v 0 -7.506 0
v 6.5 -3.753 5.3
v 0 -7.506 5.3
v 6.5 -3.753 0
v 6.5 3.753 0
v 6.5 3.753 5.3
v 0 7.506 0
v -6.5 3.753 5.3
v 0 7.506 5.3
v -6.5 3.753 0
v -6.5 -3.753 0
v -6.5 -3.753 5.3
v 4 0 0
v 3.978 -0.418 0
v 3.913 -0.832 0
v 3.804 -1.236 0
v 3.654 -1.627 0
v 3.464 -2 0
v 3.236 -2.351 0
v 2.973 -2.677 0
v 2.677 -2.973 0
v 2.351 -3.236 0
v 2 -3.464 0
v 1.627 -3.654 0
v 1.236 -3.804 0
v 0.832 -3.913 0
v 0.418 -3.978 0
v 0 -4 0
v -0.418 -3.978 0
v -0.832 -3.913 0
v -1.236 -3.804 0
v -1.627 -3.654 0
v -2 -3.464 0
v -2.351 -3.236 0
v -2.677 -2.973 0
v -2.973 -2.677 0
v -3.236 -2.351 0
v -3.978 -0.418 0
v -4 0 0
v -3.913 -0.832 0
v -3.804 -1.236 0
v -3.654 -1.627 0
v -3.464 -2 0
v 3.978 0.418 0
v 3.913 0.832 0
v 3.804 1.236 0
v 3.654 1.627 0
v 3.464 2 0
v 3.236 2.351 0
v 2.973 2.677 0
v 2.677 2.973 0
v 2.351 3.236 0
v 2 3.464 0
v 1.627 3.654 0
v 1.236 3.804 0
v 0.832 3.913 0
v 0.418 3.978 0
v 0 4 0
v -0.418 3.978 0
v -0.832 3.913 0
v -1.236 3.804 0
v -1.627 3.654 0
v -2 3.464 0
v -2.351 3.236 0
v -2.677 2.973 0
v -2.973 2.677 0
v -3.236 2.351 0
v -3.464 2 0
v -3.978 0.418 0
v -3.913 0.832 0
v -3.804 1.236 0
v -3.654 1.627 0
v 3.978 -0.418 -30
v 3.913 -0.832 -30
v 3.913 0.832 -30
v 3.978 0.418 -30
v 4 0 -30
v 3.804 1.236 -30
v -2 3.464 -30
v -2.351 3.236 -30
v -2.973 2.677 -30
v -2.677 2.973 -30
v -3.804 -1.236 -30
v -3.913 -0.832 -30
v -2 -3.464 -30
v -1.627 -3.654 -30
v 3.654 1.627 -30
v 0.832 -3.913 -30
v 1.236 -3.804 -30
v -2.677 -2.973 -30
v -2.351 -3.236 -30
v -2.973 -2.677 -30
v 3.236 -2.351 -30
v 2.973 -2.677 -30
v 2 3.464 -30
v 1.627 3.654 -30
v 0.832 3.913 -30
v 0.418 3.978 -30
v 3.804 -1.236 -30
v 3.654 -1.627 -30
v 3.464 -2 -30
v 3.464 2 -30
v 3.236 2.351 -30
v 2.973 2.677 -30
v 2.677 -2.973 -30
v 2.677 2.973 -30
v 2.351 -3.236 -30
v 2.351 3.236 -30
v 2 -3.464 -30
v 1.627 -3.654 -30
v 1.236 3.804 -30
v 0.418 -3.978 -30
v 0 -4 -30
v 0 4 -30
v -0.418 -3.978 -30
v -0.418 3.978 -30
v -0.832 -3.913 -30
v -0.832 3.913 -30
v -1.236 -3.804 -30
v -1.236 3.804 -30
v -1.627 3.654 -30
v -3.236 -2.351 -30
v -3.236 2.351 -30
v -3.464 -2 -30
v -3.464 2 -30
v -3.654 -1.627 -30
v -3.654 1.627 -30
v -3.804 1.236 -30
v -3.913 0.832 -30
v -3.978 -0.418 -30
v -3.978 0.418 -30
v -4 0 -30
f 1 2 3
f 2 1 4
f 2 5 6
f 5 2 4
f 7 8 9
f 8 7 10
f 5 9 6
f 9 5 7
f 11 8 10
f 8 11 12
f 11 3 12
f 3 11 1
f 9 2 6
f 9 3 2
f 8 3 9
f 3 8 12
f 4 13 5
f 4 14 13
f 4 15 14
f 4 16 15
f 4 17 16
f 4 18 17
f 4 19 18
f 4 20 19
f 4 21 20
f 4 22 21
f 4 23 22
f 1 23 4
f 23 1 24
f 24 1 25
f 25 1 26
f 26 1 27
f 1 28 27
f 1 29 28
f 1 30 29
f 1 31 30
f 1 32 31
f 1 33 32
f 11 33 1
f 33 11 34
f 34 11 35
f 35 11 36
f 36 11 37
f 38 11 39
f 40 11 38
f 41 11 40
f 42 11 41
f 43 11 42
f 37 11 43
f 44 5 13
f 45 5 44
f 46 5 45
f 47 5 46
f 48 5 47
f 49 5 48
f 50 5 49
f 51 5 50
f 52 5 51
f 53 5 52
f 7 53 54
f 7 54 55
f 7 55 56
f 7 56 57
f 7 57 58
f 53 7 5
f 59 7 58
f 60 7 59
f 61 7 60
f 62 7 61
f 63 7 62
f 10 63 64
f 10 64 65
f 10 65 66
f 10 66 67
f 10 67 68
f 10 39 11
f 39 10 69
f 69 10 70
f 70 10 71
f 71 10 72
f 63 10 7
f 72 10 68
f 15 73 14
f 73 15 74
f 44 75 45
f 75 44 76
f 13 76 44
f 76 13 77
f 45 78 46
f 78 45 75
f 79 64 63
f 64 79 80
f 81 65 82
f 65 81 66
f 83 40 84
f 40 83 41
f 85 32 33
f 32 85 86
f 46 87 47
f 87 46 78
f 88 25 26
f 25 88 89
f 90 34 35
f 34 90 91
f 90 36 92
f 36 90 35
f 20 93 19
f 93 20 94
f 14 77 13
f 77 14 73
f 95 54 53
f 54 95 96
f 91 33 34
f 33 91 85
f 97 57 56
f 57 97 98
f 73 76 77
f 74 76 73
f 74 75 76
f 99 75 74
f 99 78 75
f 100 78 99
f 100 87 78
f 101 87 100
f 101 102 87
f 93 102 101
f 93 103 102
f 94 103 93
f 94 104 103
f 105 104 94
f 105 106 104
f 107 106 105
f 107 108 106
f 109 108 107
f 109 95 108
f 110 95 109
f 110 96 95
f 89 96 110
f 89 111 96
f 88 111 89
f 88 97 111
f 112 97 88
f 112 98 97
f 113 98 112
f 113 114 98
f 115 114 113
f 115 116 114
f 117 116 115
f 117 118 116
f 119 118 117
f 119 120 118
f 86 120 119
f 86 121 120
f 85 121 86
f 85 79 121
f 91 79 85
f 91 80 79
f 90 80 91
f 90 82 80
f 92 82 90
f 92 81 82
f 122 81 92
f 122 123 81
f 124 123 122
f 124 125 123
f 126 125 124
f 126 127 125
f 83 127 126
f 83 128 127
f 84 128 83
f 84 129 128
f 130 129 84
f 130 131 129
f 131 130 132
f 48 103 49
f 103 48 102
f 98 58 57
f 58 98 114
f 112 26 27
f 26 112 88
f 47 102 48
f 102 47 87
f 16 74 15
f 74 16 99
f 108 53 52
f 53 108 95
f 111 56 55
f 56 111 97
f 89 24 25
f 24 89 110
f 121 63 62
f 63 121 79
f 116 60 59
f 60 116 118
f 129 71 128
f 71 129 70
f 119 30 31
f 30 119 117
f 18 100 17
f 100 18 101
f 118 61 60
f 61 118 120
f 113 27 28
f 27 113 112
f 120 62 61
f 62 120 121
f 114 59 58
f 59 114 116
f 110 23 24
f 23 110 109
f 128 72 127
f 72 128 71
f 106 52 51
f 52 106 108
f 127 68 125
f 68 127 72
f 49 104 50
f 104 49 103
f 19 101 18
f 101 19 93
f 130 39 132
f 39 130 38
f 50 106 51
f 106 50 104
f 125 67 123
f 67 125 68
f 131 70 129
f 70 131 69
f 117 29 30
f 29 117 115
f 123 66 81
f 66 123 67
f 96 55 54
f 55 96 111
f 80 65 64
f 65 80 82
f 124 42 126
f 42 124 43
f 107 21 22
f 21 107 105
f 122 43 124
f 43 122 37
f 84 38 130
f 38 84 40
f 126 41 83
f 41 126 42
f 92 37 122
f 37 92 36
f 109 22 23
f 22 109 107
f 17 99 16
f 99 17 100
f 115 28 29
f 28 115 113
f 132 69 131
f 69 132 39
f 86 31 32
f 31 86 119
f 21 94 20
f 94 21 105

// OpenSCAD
// OpenSCAD M8 Bolt Model (Simplified)
// - Head: Hexagonal prism, across-flats = 13mm, height = 5.3mm
// - Shank: Diameter = 8mm, length = 30mm, extending in z < 0 direction
// - Position: Head base at z = 0

$fn = 60; // Smoothness for cylindrical parts

module m8_bolt() {
    // Hexagonal Head (z >= 0)
    // In OpenSCAD, a hexagon with across-flats distance 'S' has an outer radius 'r' of:
    // r = S / sqrt(3)
    // S = 13mm -> r = 13 / sqrt(3)
    translate([0, 0, 0])
        rotate([0, 0, 30]) // Align flat faces with axes
            cylinder(h = 5.3, r = 13 / sqrt(3), $fn = 6);

    // Shank (z < 0)
    translate([0, 0, -30])
        cylinder(h = 30, d = 8);
}

m8_bolt();
